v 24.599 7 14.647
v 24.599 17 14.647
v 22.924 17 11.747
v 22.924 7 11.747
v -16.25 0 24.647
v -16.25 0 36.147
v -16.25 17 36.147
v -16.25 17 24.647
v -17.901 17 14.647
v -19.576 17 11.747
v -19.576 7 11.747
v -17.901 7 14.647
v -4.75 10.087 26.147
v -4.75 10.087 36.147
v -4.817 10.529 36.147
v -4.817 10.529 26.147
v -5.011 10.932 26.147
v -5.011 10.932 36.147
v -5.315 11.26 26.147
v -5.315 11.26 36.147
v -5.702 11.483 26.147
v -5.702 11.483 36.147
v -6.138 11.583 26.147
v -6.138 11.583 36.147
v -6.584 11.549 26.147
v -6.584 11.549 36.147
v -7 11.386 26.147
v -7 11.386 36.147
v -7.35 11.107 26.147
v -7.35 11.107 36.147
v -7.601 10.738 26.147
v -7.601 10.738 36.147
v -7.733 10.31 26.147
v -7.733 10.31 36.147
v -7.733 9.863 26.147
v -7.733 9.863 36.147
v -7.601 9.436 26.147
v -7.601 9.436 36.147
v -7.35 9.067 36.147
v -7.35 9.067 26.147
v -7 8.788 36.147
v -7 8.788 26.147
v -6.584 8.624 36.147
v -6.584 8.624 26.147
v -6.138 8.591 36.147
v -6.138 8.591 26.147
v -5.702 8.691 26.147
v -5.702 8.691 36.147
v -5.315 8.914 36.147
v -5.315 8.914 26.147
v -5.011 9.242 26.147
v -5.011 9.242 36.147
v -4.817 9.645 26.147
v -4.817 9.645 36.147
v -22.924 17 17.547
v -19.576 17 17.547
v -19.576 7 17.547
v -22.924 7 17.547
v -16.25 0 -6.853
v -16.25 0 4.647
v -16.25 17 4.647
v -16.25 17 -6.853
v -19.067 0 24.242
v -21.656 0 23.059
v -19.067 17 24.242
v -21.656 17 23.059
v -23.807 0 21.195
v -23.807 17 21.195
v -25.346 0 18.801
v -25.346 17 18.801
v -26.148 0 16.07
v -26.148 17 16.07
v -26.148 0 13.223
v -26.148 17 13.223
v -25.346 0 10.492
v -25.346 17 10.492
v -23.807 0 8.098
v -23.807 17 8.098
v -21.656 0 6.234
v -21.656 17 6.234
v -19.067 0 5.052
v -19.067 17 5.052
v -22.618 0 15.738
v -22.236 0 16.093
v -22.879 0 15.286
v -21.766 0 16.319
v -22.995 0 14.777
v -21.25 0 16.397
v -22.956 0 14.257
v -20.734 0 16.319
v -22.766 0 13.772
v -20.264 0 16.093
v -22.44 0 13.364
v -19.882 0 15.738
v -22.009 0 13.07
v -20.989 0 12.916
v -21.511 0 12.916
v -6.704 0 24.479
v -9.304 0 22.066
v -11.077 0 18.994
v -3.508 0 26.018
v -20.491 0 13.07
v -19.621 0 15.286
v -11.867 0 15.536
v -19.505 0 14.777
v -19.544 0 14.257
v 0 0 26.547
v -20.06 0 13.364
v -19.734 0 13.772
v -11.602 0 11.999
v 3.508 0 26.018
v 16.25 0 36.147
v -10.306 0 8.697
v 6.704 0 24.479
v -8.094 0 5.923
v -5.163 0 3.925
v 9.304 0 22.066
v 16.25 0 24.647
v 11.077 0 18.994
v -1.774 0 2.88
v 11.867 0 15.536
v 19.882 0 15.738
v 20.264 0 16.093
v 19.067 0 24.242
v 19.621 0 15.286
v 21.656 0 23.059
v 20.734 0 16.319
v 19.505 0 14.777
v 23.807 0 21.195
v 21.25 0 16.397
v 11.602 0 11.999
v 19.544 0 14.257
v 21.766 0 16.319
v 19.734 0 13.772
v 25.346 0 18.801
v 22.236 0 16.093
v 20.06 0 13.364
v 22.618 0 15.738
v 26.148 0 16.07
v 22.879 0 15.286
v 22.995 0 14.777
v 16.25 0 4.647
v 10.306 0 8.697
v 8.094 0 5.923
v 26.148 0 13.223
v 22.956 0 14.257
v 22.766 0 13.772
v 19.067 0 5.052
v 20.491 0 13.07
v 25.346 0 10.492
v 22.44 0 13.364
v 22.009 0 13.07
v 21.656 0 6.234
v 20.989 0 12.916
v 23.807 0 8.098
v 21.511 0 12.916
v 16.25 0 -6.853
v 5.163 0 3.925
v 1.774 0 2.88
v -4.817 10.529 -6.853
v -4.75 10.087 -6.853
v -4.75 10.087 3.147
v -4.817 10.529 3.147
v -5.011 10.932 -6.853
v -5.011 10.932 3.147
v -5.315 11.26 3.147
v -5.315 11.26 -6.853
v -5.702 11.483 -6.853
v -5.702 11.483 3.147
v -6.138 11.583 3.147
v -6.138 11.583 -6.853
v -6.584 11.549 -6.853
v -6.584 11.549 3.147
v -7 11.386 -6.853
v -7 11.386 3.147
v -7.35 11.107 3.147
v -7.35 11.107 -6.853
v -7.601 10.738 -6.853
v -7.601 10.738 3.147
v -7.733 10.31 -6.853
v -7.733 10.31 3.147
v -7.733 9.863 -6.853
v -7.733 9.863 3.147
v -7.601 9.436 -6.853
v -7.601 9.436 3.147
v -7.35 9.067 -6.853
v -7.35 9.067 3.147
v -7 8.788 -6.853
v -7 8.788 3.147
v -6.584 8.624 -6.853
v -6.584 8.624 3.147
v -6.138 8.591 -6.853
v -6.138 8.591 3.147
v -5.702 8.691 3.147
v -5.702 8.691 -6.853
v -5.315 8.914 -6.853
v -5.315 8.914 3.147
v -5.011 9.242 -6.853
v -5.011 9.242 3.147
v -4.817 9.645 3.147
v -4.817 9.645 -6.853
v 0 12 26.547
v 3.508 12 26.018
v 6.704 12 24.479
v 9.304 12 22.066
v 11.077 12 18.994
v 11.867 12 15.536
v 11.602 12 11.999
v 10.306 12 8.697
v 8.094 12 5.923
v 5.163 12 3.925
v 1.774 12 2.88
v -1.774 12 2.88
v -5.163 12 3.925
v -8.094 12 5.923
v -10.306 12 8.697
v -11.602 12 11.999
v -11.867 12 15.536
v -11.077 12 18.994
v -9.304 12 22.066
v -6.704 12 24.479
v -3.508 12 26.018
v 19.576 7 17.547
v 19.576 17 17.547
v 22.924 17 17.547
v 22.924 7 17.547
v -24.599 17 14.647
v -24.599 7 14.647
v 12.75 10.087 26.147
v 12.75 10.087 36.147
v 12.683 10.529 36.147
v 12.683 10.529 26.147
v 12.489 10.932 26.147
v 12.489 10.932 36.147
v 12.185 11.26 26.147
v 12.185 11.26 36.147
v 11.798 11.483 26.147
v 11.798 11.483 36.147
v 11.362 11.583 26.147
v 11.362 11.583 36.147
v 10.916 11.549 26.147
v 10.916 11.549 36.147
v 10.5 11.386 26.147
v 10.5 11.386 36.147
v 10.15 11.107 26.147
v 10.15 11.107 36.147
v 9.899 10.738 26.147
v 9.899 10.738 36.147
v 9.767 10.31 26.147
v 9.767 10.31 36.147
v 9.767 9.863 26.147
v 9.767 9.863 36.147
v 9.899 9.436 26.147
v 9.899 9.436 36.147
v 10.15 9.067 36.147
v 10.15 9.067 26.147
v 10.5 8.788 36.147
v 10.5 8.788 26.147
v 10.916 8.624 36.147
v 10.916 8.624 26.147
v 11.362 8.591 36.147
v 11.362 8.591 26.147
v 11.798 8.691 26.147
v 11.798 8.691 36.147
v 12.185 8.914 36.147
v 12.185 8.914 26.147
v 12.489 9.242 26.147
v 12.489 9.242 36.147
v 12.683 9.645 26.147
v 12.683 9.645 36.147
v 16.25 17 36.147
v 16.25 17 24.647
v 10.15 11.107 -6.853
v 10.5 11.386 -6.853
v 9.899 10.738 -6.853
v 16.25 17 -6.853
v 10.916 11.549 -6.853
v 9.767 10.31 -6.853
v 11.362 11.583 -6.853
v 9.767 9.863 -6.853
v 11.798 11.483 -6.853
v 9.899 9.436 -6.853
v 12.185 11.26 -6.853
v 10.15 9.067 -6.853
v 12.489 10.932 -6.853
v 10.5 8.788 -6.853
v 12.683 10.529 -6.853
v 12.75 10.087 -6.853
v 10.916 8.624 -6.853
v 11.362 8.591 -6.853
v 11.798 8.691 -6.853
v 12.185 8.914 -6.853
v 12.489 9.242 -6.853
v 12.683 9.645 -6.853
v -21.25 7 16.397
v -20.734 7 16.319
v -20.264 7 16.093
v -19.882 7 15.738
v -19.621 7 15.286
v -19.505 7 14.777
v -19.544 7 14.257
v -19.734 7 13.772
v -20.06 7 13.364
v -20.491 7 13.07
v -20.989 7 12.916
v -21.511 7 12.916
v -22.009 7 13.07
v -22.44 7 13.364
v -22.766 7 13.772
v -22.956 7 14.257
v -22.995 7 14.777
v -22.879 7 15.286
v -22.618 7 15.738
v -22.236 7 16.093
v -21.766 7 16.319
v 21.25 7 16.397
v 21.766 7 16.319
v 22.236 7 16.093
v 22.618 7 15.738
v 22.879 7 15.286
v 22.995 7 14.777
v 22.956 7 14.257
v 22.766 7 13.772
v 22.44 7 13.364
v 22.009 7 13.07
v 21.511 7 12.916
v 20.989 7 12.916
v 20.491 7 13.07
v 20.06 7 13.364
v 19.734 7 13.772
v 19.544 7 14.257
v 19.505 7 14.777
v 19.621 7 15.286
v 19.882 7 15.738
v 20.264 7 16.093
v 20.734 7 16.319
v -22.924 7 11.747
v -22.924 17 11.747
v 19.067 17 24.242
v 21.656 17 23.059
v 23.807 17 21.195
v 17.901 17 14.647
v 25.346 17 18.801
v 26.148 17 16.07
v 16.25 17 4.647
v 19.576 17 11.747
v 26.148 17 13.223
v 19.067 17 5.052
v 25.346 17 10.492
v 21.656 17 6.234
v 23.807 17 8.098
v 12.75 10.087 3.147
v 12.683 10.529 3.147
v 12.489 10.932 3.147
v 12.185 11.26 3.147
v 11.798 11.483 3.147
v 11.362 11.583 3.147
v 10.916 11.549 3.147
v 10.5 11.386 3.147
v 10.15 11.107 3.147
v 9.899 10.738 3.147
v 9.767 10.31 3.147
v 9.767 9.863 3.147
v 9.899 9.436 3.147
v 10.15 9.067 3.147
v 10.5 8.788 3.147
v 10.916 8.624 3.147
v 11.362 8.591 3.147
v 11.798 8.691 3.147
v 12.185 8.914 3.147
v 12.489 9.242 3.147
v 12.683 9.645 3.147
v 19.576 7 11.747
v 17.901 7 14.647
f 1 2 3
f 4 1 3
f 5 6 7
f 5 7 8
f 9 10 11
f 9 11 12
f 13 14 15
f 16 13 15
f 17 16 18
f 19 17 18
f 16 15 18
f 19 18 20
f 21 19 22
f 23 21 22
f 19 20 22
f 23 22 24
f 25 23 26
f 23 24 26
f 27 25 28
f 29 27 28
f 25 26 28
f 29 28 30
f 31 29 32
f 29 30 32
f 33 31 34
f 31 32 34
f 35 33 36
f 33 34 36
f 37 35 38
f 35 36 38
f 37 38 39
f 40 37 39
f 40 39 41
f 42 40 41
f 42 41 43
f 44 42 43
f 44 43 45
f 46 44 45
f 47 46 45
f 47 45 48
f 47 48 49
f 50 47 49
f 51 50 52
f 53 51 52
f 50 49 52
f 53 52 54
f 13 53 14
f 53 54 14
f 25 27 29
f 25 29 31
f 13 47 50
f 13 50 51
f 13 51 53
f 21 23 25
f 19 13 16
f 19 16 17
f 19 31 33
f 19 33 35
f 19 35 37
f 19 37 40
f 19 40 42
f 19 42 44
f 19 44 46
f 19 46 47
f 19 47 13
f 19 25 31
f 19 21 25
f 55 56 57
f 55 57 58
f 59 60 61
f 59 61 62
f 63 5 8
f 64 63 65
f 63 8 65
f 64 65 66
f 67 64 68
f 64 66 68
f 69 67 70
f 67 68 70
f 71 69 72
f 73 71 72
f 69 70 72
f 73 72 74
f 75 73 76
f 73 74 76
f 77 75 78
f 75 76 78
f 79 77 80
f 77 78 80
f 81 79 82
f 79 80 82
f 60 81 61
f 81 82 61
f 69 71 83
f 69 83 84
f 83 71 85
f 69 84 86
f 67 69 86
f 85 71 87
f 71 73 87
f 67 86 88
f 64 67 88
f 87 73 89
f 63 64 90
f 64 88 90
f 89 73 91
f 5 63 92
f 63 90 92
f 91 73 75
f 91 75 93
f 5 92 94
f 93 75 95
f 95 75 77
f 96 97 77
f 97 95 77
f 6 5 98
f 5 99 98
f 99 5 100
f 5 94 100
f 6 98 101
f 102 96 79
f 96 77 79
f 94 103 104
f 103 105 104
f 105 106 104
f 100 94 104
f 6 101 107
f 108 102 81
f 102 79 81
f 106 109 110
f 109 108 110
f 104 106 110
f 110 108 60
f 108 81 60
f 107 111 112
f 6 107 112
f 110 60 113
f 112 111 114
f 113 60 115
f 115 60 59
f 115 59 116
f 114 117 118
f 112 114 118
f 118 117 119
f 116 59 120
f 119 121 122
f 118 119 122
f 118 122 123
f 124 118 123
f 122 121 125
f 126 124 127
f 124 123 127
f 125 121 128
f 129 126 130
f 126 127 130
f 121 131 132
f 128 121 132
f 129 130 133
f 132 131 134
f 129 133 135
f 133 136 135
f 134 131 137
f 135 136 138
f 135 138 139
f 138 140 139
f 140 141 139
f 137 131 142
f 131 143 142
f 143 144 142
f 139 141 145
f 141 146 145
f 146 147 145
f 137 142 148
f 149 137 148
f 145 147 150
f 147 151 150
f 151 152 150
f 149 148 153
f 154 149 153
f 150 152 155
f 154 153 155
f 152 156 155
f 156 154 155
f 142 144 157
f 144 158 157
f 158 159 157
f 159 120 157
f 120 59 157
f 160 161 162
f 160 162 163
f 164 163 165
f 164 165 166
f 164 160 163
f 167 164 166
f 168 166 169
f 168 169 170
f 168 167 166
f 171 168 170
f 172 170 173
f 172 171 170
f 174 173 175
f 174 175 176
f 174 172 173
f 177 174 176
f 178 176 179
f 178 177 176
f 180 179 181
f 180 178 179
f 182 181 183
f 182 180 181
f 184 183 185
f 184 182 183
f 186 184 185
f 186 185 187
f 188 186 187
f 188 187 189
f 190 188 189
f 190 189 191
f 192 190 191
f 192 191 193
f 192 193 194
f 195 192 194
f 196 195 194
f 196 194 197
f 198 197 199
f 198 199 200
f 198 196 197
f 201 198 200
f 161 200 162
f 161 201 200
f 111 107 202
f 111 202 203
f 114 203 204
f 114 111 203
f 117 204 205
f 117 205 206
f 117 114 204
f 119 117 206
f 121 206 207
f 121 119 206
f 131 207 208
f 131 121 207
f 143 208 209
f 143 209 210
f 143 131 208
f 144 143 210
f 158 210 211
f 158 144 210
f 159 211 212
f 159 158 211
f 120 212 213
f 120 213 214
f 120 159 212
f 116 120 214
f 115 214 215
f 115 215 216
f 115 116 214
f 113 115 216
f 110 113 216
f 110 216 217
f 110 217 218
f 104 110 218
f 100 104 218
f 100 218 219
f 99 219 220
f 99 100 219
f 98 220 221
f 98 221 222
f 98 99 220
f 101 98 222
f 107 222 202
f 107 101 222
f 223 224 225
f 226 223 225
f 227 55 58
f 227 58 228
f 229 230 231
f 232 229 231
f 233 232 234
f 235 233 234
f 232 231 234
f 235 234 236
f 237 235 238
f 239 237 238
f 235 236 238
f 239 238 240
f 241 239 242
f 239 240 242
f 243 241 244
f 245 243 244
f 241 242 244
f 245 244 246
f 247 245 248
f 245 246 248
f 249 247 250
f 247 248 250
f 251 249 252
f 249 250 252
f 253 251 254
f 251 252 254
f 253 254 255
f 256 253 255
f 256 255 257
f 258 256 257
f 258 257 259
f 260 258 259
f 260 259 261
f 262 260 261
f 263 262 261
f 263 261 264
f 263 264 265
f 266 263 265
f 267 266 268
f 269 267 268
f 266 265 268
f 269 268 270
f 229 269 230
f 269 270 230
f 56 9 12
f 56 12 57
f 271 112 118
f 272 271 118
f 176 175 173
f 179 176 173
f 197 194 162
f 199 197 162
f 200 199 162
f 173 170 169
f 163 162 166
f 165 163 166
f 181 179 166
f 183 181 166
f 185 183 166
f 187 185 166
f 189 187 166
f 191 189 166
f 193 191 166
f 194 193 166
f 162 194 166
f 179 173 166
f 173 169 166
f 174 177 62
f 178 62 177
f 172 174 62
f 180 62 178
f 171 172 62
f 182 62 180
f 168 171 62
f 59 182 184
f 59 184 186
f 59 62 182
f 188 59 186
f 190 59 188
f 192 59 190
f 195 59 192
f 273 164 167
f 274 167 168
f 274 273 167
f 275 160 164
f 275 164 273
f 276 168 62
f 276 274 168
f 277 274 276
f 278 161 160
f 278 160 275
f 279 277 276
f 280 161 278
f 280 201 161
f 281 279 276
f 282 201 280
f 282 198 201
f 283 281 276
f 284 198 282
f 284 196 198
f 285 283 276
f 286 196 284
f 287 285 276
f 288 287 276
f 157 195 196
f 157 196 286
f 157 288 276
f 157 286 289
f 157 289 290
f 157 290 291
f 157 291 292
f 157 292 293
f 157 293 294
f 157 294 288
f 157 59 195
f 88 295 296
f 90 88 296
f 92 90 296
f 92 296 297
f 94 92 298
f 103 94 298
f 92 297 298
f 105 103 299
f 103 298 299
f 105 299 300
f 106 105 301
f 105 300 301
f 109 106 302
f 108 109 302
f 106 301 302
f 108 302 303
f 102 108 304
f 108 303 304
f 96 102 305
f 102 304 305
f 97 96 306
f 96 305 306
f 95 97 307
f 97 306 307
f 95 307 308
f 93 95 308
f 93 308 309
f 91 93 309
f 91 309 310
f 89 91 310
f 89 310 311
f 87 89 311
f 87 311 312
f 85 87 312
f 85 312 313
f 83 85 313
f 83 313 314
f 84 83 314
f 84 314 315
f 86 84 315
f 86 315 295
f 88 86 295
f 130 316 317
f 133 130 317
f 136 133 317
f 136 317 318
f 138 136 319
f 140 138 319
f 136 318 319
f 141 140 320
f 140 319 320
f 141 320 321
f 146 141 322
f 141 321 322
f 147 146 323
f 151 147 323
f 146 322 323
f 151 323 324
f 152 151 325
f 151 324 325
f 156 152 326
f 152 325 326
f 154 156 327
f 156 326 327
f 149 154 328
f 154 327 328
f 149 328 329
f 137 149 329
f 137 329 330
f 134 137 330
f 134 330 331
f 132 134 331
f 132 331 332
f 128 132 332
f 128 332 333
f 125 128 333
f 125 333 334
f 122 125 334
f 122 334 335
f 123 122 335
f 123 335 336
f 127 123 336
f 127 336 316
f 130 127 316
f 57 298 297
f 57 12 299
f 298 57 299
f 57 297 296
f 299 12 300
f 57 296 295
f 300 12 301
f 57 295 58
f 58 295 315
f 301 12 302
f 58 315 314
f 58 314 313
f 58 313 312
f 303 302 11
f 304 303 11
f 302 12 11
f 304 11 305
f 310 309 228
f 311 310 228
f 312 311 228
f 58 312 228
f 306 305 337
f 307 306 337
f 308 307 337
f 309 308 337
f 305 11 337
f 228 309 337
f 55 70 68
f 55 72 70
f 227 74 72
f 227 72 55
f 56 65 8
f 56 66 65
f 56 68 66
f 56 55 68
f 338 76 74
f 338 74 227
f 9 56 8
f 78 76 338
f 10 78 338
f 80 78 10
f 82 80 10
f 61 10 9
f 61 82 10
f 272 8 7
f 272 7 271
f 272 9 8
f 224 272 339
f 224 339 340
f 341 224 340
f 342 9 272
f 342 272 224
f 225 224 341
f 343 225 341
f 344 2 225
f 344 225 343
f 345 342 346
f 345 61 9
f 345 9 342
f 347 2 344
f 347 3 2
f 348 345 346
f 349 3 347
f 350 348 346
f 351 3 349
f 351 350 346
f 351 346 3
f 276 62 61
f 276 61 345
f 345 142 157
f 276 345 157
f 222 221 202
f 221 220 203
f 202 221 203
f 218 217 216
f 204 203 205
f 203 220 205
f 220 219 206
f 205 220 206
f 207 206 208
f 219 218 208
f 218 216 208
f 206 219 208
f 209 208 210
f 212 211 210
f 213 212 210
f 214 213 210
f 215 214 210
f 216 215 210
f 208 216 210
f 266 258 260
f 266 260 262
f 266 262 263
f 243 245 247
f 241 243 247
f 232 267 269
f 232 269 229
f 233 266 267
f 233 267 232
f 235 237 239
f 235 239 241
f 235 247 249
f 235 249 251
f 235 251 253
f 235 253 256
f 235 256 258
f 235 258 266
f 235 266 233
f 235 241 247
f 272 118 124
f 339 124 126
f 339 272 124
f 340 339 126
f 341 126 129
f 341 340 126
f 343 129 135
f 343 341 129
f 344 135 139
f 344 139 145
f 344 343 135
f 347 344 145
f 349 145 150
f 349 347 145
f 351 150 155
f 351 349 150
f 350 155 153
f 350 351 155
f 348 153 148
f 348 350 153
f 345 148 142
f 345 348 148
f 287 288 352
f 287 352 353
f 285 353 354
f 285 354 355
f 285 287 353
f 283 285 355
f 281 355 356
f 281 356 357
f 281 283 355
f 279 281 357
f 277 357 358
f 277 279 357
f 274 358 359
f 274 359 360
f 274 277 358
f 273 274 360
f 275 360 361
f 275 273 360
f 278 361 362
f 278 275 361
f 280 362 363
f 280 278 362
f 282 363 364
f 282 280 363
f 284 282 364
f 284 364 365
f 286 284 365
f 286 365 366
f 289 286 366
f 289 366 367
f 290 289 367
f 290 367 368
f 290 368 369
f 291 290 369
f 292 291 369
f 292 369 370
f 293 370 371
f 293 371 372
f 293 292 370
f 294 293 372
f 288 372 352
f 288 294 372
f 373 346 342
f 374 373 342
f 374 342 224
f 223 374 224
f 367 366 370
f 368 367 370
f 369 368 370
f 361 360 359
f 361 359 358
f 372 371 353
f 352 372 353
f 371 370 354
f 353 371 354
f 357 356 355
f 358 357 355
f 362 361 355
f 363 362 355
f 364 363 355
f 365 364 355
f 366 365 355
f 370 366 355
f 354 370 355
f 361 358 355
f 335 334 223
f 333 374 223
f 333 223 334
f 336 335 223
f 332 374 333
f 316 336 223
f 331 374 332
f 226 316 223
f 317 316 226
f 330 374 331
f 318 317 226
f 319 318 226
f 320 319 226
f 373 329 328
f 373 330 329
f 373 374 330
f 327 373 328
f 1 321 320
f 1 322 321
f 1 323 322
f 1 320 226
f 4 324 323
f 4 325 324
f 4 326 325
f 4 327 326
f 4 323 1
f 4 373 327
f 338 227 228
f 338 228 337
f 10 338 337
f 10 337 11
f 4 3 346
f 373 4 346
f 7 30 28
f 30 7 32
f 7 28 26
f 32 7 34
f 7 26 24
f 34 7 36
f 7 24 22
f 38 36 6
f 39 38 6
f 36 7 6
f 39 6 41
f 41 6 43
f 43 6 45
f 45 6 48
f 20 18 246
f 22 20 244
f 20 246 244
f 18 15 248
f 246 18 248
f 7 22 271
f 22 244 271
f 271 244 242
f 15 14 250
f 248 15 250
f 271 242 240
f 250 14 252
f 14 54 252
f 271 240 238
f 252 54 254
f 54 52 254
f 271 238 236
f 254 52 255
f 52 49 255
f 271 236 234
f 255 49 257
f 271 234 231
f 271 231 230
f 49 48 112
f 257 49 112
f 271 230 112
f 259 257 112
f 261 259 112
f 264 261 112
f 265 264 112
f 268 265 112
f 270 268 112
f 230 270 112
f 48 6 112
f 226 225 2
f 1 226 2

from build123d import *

# Parameters (mm, degrees)
ESQUISSE1_W         = 32.5
ESQUISSE1_H         = 43
ESQUISSE1_R         = 11.9
BOSS_EXTRU_1_DEPTH  = 12
SKETCH2_W           = 32.5
SKETCH2_H           = 43
BOSS_EXTRUDE1_DEPTH = 5
SKETCH3_R           = 1.5
CUT_EXTRUDE2_DEPTH  = 10
BOSS_EXTRUDE2_DEPTH = 17
SKETCH5_R           = 1.75
CUT_EXTRUDE3_DEPTH  = 48.797930062
SKETCH5_3_R         = 1.75
CUT_EXTRUDE4_DEPTH  = 10


with BuildPart() as part:
    # Esquisse1 → Boss.-Extru.1 (new body)
    with BuildSketch(Plane(origin=(0, 0, 0), x_dir=(1, 0, 0), z_dir=(0, 1, 0))):
        with Locations((0, -14.646640483)):
            Rectangle(ESQUISSE1_W, ESQUISSE1_H)
        with Locations(Location((0, -14.646640483, 0), (0, 0, 270))):
            Circle(ESQUISSE1_R, mode=Mode.SUBTRACT)
    extrude(amount=BOSS_EXTRU_1_DEPTH)

    # Sketch2 → Boss-Extrude1 (add)
    with BuildSketch(Plane(origin=(0, 12, 0), x_dir=(1, 0, 0), z_dir=(0, 1, 0))):
        with Locations((0, -14.646640483)):
            Rectangle(SKETCH2_W, SKETCH2_H)
    extrude(amount=BOSS_EXTRUDE1_DEPTH)

    # Sketch3 → Cut-Extrude2 (cut)
    with BuildSketch(Plane.XY.offset(36.146640483)):
        with Locations((11.25, 10.086854916)):
            Circle(SKETCH3_R)
        with Locations((-6.25, 10.086854916)):
            Circle(SKETCH3_R)
    cut_extrude2 = extrude(amount=-CUT_EXTRUDE2_DEPTH, mode=Mode.SUBTRACT)

    # Mirror1: Cut-Extrude2 across plane
    add(cut_extrude2.mirror(Plane.XY.offset(14.646640483)), mode=Mode.SUBTRACT)

    # Sketch4 → Boss-Extrude2 (add)
    with BuildSketch(Plane(origin=(0, 17, 0), x_dir=(1, 0, 0), z_dir=(0, 1, 0))):
        with BuildLine():
            Line((16.25, -4.646640483), (16.25, -24.646640483))
            ThreePointArc((16.25, -24.646640483), (26.25, -14.646640483), (16.25, -4.646640483))
        make_face()
        with BuildLine():
            Line((-16.25, -4.646640483), (-16.25, -24.646640483))
            ThreePointArc((-16.25, -24.646640483), (-26.25, -14.646640483), (-16.25, -4.646640483))
        make_face()
    extrude(amount=-BOSS_EXTRUDE2_DEPTH)

    # Sketch5 → Cut-Extrude3 (cut, through all)
    with BuildSketch(Plane(origin=(0, 17, 0), x_dir=(1, 0, 0), z_dir=(0, 1, 0))):
        with Locations(Location((-21.25, -14.646640483, 0), (0, 0, 270))):
            Circle(SKETCH5_R)
        with Locations(Location((21.25, -14.646640483, 0), (0, 0, 270))):
            Circle(SKETCH5_R)
    extrude(amount=-CUT_EXTRUDE3_DEPTH, mode=Mode.SUBTRACT)

    # Sketch5<3> → Cut-Extrude4 (cut)
    # profile 1 of 2: a face of its own
    with BuildSketch(Plane(origin=(0, 17, 0), x_dir=(1, 0, 0), z_dir=(0, 1, 0))):
        Polygon((22.924315781, -17.546640483), (24.598631561, -14.646640483), (22.924315781, -11.746640483), (19.575684219, -11.746640483), (17.901368439, -14.646640483), (19.575684219, -17.546640483), align=None)
        with Locations(Location((21.25, -14.646640483, 0), (0, 0, 270))):
            Circle(SKETCH5_3_R, mode=Mode.SUBTRACT)
    # profile 2 of 2: a face of its own
    with BuildSketch(Plane(origin=(0, 17, 0), x_dir=(1, 0, 0), z_dir=(0, 1, 0))):
        Polygon((-19.575684219, -17.546640483), (-22.924315781, -17.546640483), (-24.598631561, -14.646640483), (-22.924315781, -11.746640483), (-19.575684219, -11.746640483), (-17.901368439, -14.646640483), align=None)
        with Locations(Location((-21.25, -14.646640483, 0), (0, 0, 270))):
            Circle(SKETCH5_3_R, mode=Mode.SUBTRACT)
    extrude(amount=-CUT_EXTRUDE4_DEPTH, mode=Mode.SUBTRACT)


solid = part.part
